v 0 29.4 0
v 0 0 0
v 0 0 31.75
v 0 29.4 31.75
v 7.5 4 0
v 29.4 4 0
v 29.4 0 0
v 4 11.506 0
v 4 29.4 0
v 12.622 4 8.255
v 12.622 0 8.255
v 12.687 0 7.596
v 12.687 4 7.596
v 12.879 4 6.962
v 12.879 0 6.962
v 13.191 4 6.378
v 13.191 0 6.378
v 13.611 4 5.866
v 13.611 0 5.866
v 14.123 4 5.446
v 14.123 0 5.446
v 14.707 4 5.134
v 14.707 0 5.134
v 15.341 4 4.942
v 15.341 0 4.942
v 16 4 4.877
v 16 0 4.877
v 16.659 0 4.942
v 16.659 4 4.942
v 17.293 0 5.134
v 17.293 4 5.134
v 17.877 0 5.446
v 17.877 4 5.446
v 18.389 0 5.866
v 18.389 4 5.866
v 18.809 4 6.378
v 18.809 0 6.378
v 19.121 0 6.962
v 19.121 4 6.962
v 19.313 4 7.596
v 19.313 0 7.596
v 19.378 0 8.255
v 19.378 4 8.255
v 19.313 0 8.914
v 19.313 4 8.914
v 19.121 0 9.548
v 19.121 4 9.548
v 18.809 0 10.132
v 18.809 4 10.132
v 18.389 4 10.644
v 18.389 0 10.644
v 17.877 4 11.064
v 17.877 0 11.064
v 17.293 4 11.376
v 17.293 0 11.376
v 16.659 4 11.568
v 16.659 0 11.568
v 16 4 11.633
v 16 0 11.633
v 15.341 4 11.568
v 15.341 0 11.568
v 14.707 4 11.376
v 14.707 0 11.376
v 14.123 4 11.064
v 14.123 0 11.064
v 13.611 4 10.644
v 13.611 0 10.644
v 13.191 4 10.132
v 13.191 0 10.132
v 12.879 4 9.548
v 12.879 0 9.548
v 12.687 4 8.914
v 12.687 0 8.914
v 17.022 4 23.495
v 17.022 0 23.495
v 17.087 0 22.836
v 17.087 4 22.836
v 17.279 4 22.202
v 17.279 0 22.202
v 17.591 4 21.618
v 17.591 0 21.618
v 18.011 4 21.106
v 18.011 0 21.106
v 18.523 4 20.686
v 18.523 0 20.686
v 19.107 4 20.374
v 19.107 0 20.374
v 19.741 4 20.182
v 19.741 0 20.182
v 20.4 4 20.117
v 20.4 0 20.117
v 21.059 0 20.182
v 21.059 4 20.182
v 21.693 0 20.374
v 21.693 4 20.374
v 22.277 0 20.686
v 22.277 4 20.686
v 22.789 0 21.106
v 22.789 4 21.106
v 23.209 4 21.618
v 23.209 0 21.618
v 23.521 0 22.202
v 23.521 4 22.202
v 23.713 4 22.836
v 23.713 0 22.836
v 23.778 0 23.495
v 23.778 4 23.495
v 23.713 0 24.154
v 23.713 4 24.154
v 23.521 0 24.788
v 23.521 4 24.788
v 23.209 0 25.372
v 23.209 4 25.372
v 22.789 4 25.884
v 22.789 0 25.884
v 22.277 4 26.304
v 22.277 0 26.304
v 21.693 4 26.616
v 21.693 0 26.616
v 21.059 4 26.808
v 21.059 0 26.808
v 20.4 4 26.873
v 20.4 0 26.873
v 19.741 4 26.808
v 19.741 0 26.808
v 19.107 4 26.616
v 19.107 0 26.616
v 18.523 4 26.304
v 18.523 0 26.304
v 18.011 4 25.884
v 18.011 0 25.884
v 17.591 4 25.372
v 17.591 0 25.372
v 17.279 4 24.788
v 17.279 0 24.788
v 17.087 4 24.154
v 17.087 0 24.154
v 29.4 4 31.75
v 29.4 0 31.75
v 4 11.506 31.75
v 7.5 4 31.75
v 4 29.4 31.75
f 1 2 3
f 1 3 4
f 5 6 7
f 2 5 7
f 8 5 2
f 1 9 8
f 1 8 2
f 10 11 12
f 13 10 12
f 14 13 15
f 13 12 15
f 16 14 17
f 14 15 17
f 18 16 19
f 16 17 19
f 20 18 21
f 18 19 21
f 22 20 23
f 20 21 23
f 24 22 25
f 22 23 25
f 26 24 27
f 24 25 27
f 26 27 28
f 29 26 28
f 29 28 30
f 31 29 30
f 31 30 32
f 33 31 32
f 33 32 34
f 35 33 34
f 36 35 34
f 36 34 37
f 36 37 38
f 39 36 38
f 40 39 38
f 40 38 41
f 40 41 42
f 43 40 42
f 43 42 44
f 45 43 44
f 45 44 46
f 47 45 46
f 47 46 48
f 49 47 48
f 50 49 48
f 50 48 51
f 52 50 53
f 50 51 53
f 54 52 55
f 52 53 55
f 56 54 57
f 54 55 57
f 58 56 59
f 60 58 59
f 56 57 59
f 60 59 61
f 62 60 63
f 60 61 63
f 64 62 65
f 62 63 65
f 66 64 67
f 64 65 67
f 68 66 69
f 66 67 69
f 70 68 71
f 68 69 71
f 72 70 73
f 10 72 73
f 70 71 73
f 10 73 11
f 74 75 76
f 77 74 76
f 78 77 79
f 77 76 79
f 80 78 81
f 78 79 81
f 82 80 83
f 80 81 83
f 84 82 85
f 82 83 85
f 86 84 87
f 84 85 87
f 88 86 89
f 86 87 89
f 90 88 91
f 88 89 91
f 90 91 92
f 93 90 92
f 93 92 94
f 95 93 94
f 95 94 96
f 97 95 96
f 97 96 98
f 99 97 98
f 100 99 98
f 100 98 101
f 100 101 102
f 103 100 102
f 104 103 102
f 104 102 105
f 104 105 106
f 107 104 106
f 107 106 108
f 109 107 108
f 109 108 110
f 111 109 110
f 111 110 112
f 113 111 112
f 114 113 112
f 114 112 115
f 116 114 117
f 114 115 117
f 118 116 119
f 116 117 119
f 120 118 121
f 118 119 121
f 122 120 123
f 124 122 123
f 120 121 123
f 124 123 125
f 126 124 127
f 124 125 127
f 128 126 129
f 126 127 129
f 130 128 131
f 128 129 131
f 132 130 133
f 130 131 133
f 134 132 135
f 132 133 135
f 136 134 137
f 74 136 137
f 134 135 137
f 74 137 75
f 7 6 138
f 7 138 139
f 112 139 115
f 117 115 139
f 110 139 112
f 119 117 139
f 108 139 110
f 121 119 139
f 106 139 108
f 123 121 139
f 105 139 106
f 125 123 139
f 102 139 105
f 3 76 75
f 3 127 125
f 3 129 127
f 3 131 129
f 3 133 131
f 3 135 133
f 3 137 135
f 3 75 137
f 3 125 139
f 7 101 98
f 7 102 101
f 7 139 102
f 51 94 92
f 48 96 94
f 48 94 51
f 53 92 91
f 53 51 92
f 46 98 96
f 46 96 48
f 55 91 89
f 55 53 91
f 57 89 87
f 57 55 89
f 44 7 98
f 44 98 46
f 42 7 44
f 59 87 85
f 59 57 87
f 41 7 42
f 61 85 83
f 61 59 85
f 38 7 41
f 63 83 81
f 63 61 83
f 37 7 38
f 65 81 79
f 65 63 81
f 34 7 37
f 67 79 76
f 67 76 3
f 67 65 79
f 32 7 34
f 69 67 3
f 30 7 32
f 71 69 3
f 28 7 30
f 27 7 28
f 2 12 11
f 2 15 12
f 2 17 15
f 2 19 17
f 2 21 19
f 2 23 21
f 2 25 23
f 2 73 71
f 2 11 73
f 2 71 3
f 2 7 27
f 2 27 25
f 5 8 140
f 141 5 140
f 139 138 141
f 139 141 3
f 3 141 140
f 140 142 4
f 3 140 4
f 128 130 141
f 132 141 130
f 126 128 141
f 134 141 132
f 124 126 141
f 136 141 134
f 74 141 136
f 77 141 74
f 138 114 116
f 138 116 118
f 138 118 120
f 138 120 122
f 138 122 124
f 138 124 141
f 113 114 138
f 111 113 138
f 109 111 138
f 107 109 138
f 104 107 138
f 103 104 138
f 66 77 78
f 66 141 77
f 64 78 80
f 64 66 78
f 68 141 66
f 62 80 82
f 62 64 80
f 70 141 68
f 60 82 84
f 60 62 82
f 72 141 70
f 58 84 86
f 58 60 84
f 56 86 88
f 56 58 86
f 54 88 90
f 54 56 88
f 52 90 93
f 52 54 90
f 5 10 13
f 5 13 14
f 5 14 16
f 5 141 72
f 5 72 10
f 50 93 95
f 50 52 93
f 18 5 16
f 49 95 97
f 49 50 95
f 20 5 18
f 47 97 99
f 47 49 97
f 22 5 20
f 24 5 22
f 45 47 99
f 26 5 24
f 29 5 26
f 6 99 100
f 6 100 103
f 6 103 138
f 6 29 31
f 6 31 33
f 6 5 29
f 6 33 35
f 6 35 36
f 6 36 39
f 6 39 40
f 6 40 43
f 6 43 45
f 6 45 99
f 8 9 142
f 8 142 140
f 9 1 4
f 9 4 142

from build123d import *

# Parameters (mm, degrees)
BOSS_EXTRUDE1_DEPTH     = 31.75
F_1_4_CLEARANCE_HOLE1_D = 6.7564
CHAMFER1_SIZE           = 3.5
CHAMFER1_SIZE2          = 7.505774222


with BuildPart() as part:
    # Sketch1 → Boss-Extrude1 (new body)
    with BuildSketch(Plane.XY):
        Polygon((0, 0), (0, 29.4), (4, 29.4), (4, 4), (29.4, 4), (29.4, 0), align=None)
    extrude(amount=BOSS_EXTRUDE1_DEPTH)

    # 1/4 Clearance Hole1 (through all)
    with Locations(Plane(origin=(0, 4, 0), x_dir=(1, 0, 0), z_dir=(0, 1, 0))):
        with Locations((20.4, -23.495), (16, -8.255)):
            Hole(F_1_4_CLEARANCE_HOLE1_D / 2)

    # Chamfer1
    chamfer1_edges = [part.edges().sort_by_distance(p)[0] for p in [
        (4, 4, 15.875),
    ]]
    chamfer1_side = [part.faces().sort_by_distance(p)[0] for p in [
        (16.553612055, 4, 15.875),
    ]]
    chamfer(chamfer1_edges, length=CHAMFER1_SIZE, length2=CHAMFER1_SIZE2, reference=chamfer1_side[0])


solid = part.part
